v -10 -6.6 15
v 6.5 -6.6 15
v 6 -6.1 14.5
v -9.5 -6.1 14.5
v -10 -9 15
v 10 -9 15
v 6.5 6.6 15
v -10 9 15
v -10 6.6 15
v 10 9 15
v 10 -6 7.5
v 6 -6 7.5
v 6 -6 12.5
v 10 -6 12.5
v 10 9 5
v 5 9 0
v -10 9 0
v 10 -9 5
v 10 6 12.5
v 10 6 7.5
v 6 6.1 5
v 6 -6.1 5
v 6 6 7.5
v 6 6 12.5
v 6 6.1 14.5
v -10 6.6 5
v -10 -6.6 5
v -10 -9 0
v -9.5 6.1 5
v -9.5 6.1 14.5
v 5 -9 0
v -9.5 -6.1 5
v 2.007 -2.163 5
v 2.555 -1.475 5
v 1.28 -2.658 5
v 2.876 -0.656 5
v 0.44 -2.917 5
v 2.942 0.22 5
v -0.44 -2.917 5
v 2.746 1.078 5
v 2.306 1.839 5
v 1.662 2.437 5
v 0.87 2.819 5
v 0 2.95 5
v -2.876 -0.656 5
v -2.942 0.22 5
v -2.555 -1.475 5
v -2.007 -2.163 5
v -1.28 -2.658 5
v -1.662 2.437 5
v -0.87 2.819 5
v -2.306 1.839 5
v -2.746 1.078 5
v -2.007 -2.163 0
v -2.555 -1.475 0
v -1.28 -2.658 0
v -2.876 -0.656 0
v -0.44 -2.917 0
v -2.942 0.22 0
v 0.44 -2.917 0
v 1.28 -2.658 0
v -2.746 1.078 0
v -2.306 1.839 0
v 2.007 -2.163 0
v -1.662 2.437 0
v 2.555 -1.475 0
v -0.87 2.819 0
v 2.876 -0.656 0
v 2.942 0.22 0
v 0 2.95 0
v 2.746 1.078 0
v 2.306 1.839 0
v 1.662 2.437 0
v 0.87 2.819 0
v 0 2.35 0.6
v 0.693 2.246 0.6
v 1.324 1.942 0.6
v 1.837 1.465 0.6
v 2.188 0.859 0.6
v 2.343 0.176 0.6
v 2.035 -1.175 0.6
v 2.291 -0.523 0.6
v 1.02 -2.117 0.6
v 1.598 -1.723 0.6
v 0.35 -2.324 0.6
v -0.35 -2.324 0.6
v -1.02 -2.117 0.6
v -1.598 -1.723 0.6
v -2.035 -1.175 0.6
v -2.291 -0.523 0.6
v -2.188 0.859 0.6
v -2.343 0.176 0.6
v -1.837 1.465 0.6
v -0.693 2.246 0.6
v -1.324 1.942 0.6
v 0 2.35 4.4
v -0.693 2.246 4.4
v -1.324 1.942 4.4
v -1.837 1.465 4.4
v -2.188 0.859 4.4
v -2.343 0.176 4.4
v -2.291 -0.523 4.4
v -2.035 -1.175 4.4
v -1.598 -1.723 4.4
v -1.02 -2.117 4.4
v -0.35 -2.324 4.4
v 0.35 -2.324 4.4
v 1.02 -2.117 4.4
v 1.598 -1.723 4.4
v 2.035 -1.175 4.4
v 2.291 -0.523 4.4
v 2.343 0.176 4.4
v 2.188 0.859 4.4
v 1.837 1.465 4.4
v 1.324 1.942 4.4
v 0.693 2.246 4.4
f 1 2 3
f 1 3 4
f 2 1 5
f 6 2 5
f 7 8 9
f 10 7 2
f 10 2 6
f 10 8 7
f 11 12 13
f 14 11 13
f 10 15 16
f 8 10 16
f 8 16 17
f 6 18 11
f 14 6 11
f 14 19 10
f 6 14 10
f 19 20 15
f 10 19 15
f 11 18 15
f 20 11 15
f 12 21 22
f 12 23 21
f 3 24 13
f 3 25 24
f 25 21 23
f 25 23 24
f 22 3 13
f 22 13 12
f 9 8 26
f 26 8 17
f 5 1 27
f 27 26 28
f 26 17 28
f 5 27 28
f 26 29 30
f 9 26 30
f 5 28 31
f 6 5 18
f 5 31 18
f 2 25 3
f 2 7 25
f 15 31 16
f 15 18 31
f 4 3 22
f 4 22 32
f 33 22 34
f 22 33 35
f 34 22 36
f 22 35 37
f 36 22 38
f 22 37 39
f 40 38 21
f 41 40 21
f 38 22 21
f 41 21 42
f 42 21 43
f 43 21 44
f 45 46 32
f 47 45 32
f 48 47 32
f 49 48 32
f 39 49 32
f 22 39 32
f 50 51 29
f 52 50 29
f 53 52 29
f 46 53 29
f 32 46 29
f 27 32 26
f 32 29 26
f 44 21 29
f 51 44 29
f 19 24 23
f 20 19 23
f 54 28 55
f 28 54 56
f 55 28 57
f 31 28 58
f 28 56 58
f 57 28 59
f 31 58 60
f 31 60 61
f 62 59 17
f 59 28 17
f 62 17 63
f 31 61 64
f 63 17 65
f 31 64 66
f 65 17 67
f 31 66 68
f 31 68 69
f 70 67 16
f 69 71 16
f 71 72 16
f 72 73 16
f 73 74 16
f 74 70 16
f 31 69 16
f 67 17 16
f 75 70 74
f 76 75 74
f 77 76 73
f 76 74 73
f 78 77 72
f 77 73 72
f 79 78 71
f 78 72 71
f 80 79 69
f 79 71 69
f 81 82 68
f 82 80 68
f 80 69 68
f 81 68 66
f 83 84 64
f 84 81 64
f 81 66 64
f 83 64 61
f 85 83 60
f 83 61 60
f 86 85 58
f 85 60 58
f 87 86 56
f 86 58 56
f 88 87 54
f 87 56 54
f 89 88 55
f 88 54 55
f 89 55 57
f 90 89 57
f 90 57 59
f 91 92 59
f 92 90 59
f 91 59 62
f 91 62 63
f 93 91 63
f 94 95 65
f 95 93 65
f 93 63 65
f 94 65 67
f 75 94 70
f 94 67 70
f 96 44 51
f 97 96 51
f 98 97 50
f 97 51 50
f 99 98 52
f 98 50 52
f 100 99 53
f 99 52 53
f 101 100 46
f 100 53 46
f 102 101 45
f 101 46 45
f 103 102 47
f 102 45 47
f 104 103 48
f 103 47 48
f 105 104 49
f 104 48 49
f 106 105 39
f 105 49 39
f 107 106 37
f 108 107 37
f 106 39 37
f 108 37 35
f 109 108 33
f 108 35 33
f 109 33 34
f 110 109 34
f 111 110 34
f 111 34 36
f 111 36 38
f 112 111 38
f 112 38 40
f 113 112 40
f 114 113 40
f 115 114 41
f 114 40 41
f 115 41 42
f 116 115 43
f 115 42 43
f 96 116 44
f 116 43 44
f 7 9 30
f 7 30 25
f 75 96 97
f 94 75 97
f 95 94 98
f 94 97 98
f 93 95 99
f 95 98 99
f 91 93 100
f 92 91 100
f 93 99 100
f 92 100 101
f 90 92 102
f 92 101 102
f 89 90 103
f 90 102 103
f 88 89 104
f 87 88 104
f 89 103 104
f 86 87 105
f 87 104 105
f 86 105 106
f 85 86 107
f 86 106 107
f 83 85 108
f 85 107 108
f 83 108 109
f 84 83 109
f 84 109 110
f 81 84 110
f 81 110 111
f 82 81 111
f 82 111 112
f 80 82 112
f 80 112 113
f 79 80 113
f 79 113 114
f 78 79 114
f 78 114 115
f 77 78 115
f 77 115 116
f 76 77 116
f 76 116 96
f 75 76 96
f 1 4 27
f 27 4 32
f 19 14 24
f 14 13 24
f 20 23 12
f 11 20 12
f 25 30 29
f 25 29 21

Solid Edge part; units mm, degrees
sketch "Sketch1" plane through (0, 0, 0) normal (0, 0, 1) x (1, 0, 0)
  line L0 (-10, -9) -> (10, -9)
  line L1 (10, -9) -> (10, 9)
  line L2 (10, 9) -> (-10, 9)
  line L3 (-10, 9) -> (-10, -9)
  dimension "D1" = 18
  dimension "D2" = 20
extrude "Protrusion1" add sketch "Sketch1" along normal blind 15
sketch "Sketch2" plane through (0, 0, 15) normal (0, 0, 1) x (0, 1, 0)
  line L0 (-6.1, 10) -> (6.1, 10)
  line L1 (6.1, 10) -> (6.1, -6)
  line L2 (6.1, -6) -> (-6.1, -6)
  line L3 (-6.1, -6) -> (-6.1, 10)
  dimension "D1" = 12.2
  dimension "D2" = 16
extrude "servo_cutout" cut sketch "Sketch2" against normal blind 10
hole "screw_bearing" at (0, 0, 0) direction (0, 0, 1) diameter 4.7 depth 30 tip angle 118 start chamfer 0.6 start chamfer angle 45 end chamfer 0.6 end chamfer angle 45
chamfer "Chamfer1" distance 0.5 angle 45 5 edges at (-2, -6.1, 15) (-10, -6.1, 10) (6, 0, 15) (-2, 6.1, 15) (-10, 6.1, 10)
chamfer "side_chamfer" distance 5 angle 45 1 edges at (10, 0, 0)
sketch "Sketch3" plane through (6, 0, 9.75) normal (-1, 0, 0) x (0, -1, 0)
  line L0 (-6, -2.25) -> (6, -2.25)
  line L1 (6, -2.25) -> (6, 2.75)
  line L2 (6, 2.75) -> (-6, 2.75)
  line L3 (-6, 2.75) -> (-6, -2.25)
  dimension "D1" = 2.5
  dimension "D2" = 5
  dimension "D3" = 12
extrude "Cutout1" cut sketch "Sketch3" against normal up to next
properties material "Polypropylene, general purpose"
